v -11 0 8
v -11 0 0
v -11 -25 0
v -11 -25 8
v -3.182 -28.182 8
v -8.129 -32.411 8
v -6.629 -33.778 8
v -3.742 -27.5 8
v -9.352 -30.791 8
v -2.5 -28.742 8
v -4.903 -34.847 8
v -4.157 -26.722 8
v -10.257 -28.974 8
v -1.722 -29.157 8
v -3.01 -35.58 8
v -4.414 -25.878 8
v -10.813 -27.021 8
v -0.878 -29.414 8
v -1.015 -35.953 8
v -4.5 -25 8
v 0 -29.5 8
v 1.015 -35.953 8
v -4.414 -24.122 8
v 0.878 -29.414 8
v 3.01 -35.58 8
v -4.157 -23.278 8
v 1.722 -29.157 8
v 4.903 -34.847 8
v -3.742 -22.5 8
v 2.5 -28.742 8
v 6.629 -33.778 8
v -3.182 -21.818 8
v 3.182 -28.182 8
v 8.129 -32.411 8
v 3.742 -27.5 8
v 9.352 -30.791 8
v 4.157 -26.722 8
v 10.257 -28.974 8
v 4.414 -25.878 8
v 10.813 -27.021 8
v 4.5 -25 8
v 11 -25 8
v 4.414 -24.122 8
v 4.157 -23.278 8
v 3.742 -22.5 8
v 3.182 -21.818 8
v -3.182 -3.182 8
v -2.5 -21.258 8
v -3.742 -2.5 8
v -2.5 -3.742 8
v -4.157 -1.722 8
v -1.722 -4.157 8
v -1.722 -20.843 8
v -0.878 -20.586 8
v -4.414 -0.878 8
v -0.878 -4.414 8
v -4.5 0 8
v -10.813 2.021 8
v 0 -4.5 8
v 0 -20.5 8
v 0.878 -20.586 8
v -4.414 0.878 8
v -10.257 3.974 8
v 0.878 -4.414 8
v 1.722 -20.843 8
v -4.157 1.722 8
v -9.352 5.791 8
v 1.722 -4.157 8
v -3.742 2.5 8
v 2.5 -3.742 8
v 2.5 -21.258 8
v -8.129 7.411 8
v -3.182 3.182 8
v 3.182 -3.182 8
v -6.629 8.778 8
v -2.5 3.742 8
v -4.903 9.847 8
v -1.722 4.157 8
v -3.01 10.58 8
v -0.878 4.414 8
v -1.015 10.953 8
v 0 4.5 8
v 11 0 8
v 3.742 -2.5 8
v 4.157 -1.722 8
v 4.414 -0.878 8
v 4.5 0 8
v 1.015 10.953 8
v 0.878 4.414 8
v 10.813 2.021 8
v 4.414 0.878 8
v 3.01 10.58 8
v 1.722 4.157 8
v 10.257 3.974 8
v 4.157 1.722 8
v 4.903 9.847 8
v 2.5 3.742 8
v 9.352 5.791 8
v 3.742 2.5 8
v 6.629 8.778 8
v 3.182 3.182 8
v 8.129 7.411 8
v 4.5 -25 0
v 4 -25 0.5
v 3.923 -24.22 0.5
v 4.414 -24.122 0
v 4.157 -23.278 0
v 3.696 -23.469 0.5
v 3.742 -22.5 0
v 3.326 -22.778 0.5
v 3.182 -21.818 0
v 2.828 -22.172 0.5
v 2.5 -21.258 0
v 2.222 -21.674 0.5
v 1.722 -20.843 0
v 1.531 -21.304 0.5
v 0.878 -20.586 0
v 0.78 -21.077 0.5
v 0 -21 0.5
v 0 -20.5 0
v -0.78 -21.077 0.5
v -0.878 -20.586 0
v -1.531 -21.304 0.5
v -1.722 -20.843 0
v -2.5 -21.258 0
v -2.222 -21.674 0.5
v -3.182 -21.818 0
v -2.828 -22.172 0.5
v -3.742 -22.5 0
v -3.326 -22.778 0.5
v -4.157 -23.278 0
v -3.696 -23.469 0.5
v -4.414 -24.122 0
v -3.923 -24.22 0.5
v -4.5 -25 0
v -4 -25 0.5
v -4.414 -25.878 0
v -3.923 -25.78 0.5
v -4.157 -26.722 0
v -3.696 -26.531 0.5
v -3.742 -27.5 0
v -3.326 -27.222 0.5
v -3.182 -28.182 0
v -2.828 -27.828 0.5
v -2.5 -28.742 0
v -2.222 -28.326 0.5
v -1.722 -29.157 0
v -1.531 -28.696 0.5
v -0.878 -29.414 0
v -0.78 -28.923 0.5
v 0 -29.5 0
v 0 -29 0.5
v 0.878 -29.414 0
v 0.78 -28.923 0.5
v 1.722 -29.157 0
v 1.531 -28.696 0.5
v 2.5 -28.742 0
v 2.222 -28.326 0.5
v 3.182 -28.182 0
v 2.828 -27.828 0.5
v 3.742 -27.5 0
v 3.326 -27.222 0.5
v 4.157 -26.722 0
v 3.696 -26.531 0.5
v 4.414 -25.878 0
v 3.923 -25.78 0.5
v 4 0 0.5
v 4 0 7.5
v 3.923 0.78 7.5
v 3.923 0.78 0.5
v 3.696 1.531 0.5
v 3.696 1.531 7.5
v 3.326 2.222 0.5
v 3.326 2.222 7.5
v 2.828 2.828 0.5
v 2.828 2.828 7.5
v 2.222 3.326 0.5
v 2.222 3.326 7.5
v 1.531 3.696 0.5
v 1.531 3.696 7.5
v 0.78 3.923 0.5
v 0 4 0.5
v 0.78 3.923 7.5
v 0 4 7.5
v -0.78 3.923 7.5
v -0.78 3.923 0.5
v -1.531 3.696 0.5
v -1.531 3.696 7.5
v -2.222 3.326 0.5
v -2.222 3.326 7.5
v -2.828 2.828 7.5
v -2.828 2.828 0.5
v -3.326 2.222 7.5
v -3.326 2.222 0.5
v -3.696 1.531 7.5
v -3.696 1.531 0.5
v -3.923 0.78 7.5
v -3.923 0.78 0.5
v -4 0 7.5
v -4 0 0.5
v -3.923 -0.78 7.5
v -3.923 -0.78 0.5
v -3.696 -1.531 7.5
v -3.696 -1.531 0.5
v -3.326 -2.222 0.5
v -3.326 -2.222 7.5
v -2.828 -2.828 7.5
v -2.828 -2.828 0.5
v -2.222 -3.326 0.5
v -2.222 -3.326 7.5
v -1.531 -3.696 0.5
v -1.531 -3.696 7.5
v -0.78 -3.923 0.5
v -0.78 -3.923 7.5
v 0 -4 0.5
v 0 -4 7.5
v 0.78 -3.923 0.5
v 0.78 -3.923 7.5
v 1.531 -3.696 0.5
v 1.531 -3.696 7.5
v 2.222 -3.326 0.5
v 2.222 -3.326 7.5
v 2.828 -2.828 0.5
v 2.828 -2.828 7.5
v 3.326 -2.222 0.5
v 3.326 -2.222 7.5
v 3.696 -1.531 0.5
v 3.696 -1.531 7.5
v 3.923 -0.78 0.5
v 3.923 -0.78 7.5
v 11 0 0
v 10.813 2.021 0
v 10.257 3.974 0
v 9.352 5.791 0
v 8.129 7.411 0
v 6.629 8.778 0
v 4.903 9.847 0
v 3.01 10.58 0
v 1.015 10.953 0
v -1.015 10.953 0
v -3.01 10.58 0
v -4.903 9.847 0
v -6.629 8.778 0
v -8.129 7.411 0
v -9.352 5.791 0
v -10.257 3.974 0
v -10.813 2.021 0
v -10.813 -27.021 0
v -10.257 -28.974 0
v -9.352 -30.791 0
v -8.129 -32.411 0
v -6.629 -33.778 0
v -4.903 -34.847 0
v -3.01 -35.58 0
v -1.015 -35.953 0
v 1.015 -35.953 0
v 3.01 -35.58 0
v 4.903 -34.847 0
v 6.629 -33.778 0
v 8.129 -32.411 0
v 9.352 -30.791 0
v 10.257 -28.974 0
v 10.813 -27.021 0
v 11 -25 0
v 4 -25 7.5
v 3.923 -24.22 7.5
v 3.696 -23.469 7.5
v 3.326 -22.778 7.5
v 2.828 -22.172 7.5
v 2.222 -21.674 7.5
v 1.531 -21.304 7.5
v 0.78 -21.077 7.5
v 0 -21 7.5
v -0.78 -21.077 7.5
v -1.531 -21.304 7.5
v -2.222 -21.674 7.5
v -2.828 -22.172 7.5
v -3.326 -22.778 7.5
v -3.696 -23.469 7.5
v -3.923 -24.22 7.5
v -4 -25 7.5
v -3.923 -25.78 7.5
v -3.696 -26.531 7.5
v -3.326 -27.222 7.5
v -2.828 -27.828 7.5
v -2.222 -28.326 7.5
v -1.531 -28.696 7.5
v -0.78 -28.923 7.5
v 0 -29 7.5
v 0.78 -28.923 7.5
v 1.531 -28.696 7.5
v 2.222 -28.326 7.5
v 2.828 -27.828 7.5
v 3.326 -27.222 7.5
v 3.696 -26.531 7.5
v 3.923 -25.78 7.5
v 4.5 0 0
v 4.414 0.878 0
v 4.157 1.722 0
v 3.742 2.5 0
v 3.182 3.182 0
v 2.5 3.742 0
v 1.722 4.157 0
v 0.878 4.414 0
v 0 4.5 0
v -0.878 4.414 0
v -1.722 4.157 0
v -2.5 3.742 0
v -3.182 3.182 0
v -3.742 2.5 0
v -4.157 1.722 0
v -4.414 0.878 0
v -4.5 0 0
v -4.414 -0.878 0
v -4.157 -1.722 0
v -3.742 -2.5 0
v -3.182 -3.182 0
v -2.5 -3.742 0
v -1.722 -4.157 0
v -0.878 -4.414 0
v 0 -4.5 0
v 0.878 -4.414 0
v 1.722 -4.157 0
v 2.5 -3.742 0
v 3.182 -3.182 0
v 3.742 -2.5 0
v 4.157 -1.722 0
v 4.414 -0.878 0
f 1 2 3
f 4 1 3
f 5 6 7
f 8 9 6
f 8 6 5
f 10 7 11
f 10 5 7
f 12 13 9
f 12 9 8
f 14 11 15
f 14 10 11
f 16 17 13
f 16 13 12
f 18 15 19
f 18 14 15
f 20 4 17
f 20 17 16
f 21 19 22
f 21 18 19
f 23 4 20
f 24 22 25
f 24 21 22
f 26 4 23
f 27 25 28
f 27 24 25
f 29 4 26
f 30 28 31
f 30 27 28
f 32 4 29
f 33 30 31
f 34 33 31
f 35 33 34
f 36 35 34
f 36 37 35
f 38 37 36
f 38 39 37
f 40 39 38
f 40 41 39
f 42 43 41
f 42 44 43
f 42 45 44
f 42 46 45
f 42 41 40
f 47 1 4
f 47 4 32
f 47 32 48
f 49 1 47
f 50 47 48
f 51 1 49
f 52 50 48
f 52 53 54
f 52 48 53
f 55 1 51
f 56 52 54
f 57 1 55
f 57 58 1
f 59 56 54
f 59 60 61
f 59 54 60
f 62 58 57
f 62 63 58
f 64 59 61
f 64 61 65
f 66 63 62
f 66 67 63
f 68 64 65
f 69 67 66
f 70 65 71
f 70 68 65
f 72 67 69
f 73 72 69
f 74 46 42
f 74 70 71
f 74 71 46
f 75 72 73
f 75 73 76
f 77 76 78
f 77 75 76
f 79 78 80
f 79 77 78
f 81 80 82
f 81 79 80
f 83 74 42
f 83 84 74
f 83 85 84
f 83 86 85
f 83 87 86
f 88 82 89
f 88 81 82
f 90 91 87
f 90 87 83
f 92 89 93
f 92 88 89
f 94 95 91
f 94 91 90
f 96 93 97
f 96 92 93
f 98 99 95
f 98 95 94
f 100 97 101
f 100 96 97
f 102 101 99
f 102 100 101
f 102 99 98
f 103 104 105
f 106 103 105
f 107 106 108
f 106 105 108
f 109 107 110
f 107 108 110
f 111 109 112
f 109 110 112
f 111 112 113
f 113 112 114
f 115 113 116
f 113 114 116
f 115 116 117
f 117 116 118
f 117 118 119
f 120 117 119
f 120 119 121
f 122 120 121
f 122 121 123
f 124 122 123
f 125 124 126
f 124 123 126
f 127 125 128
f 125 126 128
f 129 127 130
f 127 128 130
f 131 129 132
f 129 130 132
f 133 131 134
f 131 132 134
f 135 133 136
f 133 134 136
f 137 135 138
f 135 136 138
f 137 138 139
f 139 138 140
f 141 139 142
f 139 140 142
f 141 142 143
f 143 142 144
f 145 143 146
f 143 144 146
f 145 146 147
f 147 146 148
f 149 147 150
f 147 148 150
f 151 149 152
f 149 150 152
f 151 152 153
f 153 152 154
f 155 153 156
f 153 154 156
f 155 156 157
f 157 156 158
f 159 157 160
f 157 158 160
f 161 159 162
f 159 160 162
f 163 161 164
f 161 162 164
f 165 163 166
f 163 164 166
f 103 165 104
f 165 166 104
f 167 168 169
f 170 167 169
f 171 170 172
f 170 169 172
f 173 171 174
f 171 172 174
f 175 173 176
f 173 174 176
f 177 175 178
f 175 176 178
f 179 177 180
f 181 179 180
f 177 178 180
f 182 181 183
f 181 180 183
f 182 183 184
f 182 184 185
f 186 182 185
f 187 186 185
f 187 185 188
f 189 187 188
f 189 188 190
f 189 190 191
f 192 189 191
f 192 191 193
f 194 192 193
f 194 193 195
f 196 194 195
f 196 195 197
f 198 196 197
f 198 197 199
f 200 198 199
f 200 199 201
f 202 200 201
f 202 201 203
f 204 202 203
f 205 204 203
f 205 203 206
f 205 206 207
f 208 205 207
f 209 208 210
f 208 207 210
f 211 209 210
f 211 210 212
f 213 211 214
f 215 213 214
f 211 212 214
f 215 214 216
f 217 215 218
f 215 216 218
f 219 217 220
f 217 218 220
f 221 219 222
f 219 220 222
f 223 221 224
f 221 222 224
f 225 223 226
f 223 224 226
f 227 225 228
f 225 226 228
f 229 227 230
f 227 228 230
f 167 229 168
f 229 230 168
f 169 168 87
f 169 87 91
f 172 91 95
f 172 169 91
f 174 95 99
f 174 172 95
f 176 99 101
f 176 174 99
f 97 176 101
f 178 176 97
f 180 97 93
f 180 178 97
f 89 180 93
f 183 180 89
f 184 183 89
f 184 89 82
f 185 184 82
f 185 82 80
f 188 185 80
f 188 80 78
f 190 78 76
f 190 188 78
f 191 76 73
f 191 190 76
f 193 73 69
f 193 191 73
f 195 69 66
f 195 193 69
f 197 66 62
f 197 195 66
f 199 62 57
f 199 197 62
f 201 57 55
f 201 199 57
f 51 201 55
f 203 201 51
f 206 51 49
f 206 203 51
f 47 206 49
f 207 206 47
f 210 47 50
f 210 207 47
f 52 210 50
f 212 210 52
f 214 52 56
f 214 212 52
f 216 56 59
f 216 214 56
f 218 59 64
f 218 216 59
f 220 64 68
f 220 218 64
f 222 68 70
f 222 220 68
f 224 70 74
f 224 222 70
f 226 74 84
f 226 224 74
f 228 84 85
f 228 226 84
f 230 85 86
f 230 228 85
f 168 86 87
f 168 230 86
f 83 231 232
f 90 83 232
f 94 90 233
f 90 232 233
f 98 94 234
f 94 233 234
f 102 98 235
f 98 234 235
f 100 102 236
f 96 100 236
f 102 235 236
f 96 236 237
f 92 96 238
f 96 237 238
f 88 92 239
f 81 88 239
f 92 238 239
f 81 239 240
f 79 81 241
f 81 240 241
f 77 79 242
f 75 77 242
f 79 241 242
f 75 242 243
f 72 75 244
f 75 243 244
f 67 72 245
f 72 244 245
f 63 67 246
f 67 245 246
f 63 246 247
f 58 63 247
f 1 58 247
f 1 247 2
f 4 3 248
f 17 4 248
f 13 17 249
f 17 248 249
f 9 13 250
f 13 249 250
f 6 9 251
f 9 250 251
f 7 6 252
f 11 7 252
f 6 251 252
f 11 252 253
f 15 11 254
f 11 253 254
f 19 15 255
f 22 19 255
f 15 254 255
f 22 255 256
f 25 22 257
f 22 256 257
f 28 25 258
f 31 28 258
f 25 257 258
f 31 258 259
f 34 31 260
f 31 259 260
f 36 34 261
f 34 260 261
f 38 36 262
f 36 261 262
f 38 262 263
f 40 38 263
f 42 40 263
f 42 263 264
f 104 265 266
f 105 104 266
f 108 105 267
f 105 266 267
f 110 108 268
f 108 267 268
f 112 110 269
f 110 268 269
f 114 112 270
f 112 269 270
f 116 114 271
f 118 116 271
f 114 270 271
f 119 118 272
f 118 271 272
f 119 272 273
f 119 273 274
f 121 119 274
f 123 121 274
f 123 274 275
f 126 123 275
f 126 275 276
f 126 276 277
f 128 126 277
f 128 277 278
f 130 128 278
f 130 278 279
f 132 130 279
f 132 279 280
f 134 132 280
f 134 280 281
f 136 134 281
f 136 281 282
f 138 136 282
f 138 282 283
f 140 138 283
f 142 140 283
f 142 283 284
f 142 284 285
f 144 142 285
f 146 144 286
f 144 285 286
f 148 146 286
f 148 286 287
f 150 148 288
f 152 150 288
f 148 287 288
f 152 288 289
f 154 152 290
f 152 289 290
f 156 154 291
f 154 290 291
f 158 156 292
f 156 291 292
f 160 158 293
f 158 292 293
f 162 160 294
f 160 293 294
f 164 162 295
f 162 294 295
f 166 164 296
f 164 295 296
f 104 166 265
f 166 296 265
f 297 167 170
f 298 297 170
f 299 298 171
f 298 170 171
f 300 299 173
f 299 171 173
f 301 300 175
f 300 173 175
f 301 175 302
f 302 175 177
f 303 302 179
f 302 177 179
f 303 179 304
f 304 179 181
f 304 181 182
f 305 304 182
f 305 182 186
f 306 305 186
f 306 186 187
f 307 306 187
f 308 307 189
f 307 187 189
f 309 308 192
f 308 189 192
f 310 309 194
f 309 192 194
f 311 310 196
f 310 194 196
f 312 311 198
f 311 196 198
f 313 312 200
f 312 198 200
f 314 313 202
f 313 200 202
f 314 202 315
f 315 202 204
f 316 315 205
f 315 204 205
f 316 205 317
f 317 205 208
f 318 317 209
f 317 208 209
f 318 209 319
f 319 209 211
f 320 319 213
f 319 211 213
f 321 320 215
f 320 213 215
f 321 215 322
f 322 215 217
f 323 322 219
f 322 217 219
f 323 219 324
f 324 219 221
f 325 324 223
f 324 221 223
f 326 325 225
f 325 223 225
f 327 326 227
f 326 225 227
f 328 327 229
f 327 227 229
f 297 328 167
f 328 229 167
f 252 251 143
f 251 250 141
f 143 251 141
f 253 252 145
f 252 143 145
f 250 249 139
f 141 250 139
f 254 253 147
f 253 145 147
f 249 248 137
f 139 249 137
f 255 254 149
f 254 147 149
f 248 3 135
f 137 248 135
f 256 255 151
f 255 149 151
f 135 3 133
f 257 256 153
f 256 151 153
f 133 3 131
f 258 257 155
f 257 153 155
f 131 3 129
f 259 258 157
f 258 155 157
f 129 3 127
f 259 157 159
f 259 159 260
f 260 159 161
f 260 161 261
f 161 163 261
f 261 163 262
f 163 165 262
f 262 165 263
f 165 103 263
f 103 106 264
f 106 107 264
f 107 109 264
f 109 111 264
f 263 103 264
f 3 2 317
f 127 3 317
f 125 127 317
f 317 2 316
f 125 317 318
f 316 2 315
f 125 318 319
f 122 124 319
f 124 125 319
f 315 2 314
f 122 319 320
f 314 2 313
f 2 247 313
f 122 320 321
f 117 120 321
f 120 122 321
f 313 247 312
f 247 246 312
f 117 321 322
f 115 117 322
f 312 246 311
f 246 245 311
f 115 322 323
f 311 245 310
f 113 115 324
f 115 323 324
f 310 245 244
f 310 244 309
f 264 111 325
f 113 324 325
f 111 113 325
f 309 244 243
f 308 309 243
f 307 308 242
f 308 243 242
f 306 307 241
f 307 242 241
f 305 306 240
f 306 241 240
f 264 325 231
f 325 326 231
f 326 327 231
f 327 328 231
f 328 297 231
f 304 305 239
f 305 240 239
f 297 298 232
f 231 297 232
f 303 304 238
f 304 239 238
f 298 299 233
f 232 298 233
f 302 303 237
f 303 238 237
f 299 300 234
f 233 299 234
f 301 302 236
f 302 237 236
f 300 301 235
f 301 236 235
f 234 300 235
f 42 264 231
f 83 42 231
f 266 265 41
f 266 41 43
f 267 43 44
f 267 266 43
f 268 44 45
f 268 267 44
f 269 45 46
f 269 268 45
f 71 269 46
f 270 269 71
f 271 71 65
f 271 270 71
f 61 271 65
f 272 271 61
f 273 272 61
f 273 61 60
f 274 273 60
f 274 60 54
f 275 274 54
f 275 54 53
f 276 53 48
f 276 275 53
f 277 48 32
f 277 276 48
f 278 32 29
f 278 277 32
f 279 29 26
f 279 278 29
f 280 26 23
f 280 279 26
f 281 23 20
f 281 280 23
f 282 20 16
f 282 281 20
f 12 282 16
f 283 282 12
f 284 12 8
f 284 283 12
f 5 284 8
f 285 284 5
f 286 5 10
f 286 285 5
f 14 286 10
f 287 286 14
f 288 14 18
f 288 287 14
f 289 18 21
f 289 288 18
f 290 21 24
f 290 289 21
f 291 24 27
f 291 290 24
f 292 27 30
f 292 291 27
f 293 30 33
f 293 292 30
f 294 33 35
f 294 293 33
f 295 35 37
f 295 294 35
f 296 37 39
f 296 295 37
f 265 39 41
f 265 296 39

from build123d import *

# Parameters (mm, degrees)
BASE_EXTRUSION_DEPTH    = 8
ESQUISSE2_R             = 4
ENL_V_MAT_EXTRU_1_DEPTH = 39.48376281
ESQUISSE3_R             = 4
ENL_V_MAT_EXTRU_2_DEPTH = 37.545825061
CHANFREIN1_SIZE         = 0.5


with BuildPart() as part:
    # Esquisse1 → Base-Extrusion (new body)
    with BuildSketch(Plane.XY):
        with BuildLine():
            Line((-11, 0), (-11, -25))
            ThreePointArc((-11, -25), (0, -36), (11, -25))
            Line((11, -25), (11, 0))
            ThreePointArc((11, 0), (0, 11), (-11, 0))
        make_face()
    extrude(amount=BASE_EXTRUSION_DEPTH)

    # Esquisse2 → Enlèv. mat.-Extru.1 (cut, through all)
    with BuildSketch(Plane.XY.offset(8)):
        Circle(ESQUISSE2_R)
    extrude(amount=-ENL_V_MAT_EXTRU_1_DEPTH, mode=Mode.SUBTRACT)

    # Esquisse3 → Enlèv. mat.-Extru.2 (cut, through all)
    with BuildSketch(Plane(origin=(-1.490572535, -22.400343219, 8), x_dir=(1, 0, 0), z_dir=(0, 0, 1))):
        with Locations((1.490572535, -2.599656781)):
            Circle(ESQUISSE3_R)
    extrude(amount=-ENL_V_MAT_EXTRU_2_DEPTH, mode=Mode.SUBTRACT)

    # Chanfrein1
    chanfrein1_edges = [part.edges().sort_by_distance(p)[0] for p in [
        (-4, 0, 0),
        (-4, 0, 8),
        (-4, -25, 0),
        (-4, -25, 8),
    ]]
    chamfer(chanfrein1_edges, length=CHANFREIN1_SIZE)


solid = part.part
